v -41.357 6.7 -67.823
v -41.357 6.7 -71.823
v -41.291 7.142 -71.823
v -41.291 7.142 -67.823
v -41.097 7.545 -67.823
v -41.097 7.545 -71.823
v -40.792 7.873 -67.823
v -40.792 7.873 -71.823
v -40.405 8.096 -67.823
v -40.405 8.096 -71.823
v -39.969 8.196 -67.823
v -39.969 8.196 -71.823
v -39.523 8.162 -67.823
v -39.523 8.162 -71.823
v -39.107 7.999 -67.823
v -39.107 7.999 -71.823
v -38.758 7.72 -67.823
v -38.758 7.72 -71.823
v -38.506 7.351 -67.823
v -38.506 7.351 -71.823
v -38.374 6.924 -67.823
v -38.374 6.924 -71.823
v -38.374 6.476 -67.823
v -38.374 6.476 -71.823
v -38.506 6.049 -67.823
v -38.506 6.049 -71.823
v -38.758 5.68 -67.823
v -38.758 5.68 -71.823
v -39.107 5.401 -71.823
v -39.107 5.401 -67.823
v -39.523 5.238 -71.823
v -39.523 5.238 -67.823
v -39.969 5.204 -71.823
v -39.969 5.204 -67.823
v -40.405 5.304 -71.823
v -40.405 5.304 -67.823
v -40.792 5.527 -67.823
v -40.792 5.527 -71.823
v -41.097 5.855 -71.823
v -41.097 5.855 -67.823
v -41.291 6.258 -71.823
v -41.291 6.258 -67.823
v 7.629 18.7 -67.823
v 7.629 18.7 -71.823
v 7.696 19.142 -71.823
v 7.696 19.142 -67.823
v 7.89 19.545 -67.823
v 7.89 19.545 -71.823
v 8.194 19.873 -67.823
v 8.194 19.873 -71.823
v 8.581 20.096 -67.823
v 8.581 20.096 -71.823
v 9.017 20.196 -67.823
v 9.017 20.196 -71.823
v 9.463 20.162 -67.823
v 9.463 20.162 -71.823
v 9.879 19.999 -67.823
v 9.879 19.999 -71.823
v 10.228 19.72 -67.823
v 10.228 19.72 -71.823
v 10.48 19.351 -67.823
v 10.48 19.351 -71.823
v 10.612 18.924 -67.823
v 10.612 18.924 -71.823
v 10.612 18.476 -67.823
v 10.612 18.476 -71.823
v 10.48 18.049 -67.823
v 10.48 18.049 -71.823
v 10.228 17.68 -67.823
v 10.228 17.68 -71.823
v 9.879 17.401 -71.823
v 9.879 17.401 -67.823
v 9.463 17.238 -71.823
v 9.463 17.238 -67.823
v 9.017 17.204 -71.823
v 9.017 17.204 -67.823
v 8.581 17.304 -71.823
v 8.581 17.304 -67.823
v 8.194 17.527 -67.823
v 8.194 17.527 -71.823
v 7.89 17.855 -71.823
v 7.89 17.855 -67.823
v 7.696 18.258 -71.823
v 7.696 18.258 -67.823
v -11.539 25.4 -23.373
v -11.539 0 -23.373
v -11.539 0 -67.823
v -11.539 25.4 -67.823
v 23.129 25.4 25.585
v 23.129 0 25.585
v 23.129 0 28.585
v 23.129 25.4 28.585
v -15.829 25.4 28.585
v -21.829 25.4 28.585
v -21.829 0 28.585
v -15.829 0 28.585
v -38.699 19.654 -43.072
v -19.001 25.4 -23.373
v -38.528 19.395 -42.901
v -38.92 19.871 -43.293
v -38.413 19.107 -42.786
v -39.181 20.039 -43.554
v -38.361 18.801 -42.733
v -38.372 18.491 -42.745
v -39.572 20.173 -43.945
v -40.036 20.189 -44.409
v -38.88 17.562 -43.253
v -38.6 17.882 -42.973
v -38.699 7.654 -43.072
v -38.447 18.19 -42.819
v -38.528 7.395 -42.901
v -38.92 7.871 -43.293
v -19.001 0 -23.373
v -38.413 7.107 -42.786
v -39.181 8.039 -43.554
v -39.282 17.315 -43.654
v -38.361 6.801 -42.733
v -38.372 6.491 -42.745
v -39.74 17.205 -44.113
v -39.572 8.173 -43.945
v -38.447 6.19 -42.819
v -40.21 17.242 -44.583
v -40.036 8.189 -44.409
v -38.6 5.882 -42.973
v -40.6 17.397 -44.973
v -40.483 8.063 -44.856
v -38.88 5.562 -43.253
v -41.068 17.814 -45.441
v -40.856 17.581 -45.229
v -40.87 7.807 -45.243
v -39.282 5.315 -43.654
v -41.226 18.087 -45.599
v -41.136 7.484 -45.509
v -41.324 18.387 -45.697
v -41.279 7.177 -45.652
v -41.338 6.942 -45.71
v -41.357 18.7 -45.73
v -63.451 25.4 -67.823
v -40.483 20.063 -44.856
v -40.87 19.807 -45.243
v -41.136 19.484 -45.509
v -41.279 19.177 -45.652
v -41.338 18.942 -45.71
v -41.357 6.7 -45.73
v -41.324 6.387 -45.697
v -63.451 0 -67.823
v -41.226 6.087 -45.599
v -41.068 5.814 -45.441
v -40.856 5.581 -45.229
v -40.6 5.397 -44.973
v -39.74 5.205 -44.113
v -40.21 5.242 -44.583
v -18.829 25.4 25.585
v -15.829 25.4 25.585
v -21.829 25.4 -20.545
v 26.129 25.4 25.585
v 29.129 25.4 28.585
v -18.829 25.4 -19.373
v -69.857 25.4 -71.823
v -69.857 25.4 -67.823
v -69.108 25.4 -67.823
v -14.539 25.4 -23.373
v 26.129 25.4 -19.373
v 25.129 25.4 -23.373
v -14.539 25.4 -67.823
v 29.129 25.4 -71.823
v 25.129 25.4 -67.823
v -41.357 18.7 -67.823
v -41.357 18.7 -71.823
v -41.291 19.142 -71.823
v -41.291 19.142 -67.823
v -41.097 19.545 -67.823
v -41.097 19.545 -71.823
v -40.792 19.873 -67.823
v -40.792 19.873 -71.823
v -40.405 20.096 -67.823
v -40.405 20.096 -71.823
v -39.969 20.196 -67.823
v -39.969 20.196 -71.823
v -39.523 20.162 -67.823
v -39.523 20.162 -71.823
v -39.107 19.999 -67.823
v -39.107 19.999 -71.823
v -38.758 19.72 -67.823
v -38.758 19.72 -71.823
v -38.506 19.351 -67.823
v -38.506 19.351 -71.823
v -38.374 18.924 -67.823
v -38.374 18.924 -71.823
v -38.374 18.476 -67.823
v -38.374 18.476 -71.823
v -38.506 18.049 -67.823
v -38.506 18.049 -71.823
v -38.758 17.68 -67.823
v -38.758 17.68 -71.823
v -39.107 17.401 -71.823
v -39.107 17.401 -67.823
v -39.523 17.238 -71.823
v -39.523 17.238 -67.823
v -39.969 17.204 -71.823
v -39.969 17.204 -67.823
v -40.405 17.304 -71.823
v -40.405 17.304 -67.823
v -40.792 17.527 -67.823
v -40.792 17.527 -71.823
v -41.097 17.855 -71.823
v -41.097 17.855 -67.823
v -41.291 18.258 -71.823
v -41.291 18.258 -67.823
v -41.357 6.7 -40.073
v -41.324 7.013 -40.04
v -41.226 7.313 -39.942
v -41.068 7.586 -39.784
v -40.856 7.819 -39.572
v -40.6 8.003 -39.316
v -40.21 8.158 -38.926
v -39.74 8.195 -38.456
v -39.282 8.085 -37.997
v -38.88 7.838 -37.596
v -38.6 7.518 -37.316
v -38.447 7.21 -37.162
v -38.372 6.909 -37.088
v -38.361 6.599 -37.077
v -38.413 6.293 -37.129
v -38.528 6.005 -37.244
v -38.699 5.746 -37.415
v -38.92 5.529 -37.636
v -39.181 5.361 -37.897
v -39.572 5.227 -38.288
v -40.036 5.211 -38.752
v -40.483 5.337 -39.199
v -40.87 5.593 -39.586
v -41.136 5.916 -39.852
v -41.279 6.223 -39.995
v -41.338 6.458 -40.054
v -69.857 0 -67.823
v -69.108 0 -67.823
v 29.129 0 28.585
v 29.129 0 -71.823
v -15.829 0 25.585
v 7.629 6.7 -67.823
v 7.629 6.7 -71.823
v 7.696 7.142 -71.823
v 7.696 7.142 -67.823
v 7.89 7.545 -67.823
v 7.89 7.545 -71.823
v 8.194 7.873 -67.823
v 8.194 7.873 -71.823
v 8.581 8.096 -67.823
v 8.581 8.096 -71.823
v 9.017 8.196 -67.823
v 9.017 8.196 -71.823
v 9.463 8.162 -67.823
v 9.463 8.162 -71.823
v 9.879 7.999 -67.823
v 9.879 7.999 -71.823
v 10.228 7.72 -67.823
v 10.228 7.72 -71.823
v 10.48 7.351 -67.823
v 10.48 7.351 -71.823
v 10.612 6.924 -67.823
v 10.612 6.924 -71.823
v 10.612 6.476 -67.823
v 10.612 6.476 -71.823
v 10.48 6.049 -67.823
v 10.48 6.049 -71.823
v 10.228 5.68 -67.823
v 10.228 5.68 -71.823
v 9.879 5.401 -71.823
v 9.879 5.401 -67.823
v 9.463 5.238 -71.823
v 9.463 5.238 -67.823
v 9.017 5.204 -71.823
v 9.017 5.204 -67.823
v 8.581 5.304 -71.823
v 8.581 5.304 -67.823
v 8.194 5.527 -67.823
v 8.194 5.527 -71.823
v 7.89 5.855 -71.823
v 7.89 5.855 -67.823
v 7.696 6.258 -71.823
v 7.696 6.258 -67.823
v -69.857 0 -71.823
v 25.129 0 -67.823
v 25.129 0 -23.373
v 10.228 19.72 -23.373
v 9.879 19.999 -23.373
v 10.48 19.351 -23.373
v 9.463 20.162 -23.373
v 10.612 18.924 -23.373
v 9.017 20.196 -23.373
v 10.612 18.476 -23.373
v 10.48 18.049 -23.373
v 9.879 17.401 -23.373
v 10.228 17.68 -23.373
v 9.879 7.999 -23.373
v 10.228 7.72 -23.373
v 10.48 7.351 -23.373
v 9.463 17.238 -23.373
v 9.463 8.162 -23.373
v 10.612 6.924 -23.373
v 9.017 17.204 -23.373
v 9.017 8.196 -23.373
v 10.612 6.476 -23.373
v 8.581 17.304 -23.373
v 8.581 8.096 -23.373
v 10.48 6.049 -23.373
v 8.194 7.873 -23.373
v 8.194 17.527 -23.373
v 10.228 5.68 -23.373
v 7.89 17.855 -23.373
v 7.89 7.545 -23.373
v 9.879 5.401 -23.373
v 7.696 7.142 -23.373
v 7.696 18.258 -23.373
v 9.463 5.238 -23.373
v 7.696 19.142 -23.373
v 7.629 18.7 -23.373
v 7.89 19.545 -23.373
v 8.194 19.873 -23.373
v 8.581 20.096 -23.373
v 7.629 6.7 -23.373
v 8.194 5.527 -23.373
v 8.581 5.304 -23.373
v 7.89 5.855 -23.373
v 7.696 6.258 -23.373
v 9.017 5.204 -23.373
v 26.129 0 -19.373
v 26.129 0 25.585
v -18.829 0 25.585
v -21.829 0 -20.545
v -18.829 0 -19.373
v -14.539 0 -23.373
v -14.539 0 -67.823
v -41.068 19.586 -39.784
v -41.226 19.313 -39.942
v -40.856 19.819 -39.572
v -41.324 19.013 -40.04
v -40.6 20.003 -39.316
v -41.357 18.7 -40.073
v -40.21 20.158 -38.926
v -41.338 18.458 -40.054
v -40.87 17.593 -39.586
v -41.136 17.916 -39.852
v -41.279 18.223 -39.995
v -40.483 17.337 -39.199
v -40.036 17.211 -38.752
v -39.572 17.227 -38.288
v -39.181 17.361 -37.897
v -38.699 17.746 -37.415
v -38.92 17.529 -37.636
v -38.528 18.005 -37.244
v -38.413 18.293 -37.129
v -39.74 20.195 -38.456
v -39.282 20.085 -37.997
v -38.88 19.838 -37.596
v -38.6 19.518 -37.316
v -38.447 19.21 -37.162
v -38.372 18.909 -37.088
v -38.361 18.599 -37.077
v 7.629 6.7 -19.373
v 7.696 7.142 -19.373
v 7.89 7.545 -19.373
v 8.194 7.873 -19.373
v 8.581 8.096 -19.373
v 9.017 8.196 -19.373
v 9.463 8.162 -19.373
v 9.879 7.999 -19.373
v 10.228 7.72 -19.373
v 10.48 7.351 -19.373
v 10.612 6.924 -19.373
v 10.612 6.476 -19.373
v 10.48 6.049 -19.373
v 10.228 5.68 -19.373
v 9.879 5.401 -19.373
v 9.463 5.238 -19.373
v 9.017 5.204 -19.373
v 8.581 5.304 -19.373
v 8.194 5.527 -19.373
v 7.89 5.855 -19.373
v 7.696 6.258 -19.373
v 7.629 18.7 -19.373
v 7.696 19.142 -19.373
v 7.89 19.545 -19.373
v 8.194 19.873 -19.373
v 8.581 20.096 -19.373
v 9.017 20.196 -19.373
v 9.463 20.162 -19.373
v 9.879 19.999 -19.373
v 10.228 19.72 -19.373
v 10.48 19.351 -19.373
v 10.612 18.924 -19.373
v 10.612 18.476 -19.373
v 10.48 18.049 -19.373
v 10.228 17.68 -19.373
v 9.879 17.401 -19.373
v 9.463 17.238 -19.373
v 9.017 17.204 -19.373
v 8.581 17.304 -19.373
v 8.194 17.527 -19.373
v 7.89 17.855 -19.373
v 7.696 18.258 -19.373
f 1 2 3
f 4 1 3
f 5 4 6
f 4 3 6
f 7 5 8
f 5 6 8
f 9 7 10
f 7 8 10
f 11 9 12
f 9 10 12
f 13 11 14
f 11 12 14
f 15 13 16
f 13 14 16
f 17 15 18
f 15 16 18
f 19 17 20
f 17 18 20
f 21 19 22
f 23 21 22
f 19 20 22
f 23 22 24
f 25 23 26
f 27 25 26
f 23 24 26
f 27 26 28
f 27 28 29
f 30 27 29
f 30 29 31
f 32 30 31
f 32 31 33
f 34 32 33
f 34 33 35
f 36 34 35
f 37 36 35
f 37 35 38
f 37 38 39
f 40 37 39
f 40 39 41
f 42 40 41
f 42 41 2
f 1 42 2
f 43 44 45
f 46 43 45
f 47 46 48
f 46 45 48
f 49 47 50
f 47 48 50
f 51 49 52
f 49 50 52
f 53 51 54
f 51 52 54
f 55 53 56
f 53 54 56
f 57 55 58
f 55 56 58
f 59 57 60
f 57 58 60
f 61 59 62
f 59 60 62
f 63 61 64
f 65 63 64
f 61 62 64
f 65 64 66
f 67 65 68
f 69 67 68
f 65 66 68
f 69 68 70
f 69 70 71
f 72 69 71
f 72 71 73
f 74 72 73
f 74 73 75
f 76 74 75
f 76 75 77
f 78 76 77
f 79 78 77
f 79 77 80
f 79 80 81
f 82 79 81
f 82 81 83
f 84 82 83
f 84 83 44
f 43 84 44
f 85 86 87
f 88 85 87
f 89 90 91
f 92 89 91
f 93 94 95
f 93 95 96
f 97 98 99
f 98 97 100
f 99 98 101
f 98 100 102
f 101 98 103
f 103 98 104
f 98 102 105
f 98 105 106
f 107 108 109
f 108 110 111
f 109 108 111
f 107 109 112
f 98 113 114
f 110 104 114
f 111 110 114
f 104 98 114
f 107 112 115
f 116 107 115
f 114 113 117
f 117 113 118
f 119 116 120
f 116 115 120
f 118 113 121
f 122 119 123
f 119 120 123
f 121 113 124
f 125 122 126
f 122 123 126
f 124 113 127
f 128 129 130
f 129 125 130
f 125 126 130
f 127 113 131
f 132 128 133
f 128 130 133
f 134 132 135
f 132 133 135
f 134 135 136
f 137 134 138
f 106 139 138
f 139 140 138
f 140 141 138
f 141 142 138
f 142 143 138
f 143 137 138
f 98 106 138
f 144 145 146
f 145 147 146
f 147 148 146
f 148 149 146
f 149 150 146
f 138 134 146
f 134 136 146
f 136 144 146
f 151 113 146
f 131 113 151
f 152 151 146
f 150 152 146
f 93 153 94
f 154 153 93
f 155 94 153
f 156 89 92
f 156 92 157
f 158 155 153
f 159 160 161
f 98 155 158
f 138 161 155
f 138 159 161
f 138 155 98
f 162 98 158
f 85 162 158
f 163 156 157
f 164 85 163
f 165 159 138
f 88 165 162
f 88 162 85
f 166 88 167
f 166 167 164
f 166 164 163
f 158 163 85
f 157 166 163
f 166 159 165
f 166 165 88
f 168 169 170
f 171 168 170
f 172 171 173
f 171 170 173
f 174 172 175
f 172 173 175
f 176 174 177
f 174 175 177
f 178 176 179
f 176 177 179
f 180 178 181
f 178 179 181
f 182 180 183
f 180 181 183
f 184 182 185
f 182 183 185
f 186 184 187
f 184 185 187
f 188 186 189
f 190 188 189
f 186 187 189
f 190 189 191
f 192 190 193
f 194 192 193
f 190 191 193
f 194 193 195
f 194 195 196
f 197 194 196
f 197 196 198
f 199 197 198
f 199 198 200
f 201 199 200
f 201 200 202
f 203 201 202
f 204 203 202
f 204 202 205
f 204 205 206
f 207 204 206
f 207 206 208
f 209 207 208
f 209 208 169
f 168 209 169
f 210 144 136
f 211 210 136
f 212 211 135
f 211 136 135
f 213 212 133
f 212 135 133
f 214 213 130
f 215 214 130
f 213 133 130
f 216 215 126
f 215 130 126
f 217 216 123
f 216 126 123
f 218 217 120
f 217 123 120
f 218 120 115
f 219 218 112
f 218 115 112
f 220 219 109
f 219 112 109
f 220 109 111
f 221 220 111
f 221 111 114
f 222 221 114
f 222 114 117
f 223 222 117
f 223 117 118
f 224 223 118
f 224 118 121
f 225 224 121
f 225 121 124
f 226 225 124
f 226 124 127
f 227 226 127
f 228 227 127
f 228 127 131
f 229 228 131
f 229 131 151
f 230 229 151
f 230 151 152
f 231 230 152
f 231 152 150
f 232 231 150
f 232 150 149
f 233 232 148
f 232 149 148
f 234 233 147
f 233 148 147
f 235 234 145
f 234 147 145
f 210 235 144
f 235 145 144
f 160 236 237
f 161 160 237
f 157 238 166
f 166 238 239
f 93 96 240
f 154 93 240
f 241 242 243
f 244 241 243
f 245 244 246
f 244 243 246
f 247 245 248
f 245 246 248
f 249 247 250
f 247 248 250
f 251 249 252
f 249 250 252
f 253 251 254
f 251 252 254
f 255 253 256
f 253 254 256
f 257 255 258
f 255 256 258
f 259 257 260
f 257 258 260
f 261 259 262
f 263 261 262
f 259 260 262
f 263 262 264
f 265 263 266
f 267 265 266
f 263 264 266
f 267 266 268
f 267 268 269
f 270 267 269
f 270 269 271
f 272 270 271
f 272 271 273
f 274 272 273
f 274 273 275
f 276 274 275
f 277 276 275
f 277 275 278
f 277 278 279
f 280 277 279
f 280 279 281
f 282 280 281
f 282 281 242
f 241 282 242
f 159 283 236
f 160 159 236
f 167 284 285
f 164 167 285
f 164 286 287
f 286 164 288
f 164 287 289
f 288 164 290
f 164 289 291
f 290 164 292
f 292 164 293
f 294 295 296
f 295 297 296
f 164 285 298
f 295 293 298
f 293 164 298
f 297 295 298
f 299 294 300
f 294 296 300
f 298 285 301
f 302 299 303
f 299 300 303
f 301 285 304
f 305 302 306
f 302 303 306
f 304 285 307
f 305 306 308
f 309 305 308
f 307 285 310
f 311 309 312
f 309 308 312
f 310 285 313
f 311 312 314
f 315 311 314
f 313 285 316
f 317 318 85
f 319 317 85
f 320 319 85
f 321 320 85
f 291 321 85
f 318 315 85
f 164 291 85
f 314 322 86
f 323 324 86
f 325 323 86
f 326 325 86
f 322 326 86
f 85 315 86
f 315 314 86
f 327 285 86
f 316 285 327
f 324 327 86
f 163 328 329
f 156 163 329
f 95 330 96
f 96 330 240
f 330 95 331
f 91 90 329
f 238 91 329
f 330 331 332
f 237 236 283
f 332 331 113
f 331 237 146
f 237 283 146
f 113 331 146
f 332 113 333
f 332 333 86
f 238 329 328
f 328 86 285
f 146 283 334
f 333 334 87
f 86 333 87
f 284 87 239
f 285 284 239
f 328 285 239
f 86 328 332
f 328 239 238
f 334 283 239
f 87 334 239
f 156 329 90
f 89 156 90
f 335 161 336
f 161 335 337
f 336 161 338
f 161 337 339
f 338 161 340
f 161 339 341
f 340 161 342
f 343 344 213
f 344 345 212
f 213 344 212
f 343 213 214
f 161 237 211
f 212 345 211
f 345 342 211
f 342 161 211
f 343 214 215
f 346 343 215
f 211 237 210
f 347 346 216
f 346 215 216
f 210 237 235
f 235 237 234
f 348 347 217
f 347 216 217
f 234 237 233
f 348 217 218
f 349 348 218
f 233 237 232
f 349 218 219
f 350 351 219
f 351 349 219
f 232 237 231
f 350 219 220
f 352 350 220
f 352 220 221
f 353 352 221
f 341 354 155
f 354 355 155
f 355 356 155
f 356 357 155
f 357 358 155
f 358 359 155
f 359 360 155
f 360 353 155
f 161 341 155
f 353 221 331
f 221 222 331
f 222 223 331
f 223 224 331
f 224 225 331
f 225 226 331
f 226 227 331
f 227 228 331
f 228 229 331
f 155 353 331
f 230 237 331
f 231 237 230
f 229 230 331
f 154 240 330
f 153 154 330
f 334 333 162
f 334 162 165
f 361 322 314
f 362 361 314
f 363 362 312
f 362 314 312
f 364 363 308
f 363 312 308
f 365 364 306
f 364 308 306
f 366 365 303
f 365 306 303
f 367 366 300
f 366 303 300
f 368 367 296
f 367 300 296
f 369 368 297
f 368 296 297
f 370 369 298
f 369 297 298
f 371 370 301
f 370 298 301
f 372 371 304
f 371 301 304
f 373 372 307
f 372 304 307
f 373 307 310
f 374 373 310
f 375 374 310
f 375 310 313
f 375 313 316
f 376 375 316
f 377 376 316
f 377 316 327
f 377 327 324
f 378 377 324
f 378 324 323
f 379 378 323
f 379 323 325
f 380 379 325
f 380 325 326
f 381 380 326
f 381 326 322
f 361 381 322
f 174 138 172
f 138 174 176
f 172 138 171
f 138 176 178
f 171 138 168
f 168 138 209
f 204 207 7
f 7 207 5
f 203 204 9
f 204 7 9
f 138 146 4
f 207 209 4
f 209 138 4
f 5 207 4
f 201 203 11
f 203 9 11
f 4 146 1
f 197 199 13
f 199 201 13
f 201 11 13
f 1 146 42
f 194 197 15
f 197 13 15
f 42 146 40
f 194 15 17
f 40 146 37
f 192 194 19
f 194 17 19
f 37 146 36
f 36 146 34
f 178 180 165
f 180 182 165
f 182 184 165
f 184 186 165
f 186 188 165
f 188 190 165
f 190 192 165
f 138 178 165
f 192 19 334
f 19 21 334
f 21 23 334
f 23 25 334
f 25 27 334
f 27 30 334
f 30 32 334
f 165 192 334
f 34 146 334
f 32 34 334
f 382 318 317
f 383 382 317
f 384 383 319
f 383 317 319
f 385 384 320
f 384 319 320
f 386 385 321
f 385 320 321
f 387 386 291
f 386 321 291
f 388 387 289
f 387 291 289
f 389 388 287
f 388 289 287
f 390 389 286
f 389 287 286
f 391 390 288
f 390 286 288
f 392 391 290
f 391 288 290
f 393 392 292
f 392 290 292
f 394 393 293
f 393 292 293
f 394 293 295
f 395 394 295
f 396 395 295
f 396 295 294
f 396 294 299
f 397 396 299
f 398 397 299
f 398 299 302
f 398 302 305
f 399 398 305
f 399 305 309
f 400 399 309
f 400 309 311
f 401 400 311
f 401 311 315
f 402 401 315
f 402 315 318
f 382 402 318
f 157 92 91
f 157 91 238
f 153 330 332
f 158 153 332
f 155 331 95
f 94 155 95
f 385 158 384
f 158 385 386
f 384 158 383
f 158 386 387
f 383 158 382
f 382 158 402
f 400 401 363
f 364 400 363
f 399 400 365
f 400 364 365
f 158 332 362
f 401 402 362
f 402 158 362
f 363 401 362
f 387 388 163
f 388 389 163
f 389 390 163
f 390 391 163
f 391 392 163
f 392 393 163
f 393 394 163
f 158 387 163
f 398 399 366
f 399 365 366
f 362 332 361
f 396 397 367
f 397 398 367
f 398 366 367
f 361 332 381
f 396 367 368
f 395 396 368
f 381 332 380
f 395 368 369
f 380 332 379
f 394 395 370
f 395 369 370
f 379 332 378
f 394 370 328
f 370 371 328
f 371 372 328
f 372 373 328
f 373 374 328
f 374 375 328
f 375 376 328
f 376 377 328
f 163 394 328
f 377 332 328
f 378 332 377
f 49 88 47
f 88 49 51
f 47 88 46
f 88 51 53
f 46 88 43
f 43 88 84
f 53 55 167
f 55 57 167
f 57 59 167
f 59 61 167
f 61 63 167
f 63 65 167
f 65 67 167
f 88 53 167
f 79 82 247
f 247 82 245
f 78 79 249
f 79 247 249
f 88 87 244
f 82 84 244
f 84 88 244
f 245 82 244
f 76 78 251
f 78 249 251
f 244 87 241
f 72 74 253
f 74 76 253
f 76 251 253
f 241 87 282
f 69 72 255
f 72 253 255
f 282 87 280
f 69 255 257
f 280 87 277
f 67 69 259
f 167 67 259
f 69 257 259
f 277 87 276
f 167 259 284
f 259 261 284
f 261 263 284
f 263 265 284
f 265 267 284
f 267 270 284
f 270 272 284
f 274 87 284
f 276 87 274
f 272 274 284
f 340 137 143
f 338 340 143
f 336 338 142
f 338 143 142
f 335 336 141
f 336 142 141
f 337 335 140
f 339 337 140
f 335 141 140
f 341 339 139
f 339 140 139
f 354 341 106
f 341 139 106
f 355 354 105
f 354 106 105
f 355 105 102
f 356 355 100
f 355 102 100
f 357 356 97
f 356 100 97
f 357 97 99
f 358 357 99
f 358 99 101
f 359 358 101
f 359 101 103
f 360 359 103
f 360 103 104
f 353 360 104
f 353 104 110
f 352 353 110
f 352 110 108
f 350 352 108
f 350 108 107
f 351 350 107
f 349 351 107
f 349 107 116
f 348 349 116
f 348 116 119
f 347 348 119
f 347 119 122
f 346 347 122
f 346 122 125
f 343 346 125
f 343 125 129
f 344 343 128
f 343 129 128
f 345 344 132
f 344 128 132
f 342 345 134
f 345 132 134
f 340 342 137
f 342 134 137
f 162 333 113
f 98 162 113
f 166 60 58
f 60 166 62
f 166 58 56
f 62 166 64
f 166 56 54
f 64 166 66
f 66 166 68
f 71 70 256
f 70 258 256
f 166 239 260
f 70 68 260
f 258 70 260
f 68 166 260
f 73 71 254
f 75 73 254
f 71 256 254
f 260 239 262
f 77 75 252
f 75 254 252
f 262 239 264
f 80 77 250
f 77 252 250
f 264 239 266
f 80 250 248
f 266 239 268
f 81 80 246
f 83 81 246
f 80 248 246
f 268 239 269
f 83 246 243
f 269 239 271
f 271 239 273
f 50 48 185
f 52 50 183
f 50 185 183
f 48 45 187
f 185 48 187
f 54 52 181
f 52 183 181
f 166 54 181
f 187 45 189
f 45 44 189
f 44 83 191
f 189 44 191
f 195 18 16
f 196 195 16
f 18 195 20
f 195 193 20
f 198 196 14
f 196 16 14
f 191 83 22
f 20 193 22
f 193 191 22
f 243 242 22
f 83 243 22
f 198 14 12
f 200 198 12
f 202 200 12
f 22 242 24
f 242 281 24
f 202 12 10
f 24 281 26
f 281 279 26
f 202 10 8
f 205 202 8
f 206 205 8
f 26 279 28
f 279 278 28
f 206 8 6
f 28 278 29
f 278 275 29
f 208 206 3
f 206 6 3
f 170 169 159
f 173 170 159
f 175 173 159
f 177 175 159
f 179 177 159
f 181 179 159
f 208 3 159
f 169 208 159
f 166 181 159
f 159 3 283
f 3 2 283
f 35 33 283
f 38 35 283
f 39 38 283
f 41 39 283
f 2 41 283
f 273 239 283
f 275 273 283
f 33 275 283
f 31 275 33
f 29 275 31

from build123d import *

# Parameters (mm, degrees)
SKETCH1_W           = 3
SKETCH1_H           = 44.45
BOSS_EXTRUDE1_DEPTH = 25.4
SKETCH10_R          = 1.5
CUT_EXTRUDE1_DEPTH  = 125.927823604


with BuildPart() as part:
    # Sketch1 → Boss-Extrude1 (new body)
    with BuildSketch(Plane(origin=(0, 0, 0), x_dir=(1, 0, 0), z_dir=(0, 1, 0))):
        with Locations((-13.038815819, 45.598435945)):
            Rectangle(SKETCH1_W, SKETCH1_H)
        Polygon((25.128862589, 23.373435945), (29.128862589, 23.373435945), (29.128862589, 71.823435945), (25.128862589, 71.823435945), (25.128862589, 67.823435945), align=None)
        Polygon((-67.439681, 71.812406658), (-63.450710286, 67.823435945), (-14.538815819, 67.823435945), (-11.538815819, 67.823435945), (25.128862589, 67.823435945), (25.128862589, 71.823435945), (-69.857244767, 71.823435945), (-69.857244767, 69.394842891), align=None)
        Polygon((-69.857244767, 68.573116176), (-69.107564536, 67.823435945), (-63.450710286, 67.823435945), (-67.439681, 71.812406658), (-69.857244767, 69.394842891), align=None)
        Polygon((-69.857244767, 67.823435945), (-69.107564536, 67.823435945), (-69.857244767, 68.573116176), align=None)
        Polygon((-69.107564536, 67.823435945), (-21.829137411, 20.54500882), (-21.829137411, 23.373435945), (-19.000710286, 23.373435945), (-63.450710286, 67.823435945), align=None)
        Polygon((-21.829137411, 20.54500882), (-21.829137411, -28.584564055), (-15.829137411, -28.584564055), (-15.829137411, -25.584564055), (-18.829137411, -25.584564055), (-18.829137411, 19.373435945), (26.128862589, 19.373435945), (26.128862589, -25.584564055), (23.128862589, -25.584564055), (23.128862589, -28.584564055), (29.128862589, -28.584564055), (29.128862589, 23.373435945), (25.128862589, 23.373435945), (-11.538815819, 23.373435945), (-14.538815819, 23.373435945), (-19.000710286, 23.373435945), align=None)
        Polygon((-21.829137411, 23.373435945), (-21.829137411, 20.54500882), (-19.000710286, 23.373435945), align=None)
    extrude(amount=BOSS_EXTRUDE1_DEPTH)

    # Sketch10 → Cut-Extrude1 (cut, through all)
    with BuildSketch(Plane(origin=(0, 0, -71.823435945), x_dir=(-1, 0, 0), z_dir=(0, 0, -1))):
        with Locations((39.857244767, 6.7)):
            Circle(SKETCH10_R)
        with Locations((39.857244767, 18.7)):
            Circle(SKETCH10_R)
        with Locations((-9.128862589, 6.7)):
            Circle(SKETCH10_R)
        with Locations((-9.128862589, 18.7)):
            Circle(SKETCH10_R)
    extrude(amount=-CUT_EXTRUDE1_DEPTH, mode=Mode.SUBTRACT)


solid = part.part
